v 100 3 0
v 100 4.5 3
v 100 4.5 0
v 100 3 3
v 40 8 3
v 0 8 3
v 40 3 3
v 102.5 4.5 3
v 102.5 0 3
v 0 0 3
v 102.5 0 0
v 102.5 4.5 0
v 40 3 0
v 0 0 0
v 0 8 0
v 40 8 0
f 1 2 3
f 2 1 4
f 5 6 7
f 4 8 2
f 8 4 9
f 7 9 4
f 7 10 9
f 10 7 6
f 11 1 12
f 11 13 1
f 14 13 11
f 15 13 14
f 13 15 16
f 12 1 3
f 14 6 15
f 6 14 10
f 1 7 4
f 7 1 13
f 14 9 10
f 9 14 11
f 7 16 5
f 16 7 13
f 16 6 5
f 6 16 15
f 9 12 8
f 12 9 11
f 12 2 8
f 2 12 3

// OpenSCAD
cube([100, 3, 3]);
cube([40, 8, 3]);
translate([100,0,0]) cube([2.5, 4.5, 3]);
